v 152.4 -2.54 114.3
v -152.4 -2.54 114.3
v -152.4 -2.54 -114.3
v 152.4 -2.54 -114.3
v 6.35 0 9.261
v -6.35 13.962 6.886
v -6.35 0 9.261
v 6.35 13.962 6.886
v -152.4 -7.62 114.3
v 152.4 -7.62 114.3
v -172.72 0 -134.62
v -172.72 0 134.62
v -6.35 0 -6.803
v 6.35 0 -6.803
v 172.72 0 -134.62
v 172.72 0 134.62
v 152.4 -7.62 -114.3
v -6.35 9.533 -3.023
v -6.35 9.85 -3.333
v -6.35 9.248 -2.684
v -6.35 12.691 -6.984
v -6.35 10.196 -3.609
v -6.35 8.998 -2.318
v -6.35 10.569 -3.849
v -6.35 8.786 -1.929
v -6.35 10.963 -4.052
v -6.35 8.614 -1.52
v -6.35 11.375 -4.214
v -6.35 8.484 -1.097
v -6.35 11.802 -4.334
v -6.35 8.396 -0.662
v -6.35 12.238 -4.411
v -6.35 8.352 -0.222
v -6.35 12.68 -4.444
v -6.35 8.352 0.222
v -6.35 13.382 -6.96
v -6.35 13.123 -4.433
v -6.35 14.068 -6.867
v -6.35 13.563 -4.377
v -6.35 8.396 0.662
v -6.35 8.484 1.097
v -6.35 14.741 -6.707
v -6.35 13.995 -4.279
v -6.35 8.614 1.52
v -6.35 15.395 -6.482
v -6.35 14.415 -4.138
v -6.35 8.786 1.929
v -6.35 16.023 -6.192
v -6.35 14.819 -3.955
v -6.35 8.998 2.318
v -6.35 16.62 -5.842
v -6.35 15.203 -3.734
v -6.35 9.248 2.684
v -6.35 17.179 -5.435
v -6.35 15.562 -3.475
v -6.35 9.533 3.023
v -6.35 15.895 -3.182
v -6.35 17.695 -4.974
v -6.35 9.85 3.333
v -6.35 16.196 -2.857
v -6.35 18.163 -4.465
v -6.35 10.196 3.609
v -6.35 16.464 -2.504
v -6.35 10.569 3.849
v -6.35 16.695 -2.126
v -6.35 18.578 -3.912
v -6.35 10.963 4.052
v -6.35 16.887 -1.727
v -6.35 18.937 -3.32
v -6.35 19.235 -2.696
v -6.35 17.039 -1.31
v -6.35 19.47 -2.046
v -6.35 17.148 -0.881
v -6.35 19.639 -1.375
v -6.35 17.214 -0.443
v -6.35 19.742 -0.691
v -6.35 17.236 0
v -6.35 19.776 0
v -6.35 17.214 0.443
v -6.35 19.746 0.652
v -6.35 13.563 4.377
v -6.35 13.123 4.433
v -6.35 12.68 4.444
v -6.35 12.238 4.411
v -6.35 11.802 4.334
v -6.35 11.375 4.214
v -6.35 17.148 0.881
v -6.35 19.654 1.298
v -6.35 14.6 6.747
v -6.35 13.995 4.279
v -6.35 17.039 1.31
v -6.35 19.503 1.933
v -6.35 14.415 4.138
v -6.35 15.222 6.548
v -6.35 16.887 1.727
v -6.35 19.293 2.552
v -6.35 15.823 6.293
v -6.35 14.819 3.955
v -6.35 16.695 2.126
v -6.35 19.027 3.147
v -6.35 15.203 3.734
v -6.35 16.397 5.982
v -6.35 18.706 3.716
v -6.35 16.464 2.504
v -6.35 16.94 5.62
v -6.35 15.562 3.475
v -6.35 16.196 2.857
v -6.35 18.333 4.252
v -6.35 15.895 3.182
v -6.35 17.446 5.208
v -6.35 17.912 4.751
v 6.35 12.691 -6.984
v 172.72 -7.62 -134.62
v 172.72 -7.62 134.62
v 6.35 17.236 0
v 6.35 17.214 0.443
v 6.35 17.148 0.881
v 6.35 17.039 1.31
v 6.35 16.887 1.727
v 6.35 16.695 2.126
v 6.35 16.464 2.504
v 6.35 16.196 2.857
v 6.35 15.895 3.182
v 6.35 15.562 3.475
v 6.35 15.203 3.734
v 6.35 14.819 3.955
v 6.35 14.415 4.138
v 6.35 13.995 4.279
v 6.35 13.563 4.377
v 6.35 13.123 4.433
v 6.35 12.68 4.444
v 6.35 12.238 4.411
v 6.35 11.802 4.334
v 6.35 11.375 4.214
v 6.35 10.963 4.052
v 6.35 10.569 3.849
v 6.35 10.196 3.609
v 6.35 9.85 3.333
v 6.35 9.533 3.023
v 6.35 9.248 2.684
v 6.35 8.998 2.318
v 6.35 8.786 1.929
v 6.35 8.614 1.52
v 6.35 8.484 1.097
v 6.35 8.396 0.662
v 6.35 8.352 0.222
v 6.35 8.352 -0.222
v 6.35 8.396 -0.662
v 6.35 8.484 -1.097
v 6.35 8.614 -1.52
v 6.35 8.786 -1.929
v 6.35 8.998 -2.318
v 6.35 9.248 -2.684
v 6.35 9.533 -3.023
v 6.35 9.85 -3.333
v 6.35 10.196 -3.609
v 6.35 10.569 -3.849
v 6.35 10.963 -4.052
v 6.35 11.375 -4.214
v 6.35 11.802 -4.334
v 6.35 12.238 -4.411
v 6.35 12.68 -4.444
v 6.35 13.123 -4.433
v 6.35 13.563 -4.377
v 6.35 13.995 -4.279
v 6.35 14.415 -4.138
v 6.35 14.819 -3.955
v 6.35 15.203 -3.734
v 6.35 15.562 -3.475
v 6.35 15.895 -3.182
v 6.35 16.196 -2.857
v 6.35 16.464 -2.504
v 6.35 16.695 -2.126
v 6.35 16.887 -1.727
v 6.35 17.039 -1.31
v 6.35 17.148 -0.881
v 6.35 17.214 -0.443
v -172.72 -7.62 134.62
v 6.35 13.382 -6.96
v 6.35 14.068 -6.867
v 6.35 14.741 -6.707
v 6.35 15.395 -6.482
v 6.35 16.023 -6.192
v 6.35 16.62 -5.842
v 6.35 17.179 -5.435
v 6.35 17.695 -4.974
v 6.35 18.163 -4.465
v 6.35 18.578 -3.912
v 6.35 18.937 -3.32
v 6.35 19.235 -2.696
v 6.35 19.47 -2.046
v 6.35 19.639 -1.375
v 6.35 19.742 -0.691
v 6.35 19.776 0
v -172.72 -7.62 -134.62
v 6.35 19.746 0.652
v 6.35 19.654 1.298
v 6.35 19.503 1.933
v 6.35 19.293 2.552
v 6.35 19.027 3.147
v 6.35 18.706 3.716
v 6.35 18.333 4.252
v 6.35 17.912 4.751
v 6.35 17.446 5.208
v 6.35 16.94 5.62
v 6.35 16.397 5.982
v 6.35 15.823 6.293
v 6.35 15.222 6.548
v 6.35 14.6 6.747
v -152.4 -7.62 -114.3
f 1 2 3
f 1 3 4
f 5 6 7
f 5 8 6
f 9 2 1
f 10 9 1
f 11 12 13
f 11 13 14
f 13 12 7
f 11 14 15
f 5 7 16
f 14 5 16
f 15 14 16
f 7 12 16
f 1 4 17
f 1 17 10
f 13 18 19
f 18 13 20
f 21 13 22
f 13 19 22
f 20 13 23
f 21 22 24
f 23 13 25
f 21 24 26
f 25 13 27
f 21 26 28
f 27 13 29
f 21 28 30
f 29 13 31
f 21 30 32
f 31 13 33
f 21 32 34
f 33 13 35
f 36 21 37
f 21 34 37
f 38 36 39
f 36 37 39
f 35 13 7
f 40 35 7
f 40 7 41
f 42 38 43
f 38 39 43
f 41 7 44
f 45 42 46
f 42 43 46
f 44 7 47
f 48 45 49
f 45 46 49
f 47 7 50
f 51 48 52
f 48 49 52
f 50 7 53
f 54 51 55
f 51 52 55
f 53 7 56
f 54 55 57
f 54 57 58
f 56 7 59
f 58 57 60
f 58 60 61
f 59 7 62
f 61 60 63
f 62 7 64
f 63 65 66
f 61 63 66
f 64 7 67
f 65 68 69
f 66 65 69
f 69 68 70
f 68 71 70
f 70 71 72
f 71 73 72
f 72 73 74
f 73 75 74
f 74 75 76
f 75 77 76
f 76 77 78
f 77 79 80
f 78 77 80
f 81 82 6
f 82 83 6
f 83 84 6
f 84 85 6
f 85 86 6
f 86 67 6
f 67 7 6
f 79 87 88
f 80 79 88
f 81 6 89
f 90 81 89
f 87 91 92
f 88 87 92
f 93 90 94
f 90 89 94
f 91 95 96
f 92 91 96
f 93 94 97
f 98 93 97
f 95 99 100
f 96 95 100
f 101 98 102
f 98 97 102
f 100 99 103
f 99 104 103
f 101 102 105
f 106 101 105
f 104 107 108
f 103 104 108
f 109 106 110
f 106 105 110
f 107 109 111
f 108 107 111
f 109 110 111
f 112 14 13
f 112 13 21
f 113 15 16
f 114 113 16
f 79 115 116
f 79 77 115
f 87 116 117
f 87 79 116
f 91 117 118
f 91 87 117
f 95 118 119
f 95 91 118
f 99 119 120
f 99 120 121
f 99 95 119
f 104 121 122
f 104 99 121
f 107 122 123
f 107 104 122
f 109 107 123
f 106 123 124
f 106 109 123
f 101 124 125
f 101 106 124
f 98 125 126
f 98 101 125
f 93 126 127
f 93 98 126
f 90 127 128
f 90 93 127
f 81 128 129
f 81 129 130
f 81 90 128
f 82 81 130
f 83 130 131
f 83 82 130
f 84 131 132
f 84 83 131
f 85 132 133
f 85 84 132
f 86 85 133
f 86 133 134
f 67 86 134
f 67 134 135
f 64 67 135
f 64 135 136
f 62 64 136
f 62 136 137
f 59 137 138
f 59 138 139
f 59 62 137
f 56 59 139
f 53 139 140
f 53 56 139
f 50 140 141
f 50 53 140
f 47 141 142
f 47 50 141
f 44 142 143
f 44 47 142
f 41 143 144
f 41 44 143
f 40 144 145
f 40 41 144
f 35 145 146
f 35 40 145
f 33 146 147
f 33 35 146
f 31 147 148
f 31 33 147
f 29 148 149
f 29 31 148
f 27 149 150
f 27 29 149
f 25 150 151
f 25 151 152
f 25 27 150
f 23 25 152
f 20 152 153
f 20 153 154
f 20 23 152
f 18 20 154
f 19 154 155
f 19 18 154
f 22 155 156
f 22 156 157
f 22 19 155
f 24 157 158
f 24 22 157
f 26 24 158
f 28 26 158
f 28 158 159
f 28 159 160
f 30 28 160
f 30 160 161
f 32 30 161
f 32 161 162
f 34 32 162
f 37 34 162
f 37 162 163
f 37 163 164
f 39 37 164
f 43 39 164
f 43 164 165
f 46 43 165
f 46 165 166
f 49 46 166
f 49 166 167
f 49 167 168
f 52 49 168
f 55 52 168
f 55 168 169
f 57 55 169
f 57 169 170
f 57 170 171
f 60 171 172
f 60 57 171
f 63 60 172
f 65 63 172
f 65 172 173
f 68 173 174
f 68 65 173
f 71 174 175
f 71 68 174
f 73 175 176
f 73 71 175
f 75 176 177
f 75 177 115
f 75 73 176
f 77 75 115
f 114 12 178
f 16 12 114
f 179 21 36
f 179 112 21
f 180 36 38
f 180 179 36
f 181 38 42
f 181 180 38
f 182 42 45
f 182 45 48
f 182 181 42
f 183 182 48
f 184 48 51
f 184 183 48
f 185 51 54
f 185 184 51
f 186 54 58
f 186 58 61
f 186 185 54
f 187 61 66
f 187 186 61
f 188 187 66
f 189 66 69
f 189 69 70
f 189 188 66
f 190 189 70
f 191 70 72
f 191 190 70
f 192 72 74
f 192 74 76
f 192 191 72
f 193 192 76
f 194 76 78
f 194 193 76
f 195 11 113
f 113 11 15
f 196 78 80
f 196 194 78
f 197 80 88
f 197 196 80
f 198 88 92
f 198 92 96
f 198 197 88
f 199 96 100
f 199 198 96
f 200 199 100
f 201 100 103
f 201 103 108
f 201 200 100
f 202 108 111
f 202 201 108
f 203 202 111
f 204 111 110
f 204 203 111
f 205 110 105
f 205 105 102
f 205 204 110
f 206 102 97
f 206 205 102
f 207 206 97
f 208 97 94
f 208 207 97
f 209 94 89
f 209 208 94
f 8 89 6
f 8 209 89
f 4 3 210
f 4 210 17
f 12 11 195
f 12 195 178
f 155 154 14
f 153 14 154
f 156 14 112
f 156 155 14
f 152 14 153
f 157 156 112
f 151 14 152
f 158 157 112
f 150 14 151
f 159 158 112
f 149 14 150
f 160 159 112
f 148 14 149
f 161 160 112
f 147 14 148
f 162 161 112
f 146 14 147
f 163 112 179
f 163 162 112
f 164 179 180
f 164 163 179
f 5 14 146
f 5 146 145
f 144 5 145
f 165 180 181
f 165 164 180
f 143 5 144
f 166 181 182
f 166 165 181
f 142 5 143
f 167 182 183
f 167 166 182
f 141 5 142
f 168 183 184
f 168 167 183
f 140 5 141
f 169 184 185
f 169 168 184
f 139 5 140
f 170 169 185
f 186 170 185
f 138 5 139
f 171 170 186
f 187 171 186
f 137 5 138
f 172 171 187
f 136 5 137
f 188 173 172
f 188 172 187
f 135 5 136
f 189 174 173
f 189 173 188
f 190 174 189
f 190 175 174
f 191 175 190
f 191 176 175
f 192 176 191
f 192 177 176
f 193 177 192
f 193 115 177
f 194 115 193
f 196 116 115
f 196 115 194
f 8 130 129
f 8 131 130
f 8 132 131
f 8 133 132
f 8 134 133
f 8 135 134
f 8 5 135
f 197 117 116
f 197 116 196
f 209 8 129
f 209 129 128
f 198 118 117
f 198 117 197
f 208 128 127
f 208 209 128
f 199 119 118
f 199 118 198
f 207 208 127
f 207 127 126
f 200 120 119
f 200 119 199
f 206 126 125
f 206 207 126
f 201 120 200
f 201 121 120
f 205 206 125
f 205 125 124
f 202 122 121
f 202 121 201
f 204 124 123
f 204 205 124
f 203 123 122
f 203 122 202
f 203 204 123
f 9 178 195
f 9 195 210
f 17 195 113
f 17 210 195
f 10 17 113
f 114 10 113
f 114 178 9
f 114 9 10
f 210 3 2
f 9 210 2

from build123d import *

# Parameters (mm, degrees)
F0_W     = 304.8
F0_H     = 228.6
F1_DEPTH = 2.54
F0_W_2   = 345.44
F0_H_2   = 269.24
F2_DEPTH = 7.62
F3_R     = 4.445
F4_DEPTH = 6.35


with BuildPart() as f1:
    # F0 (on Front) → F1 (new body)
    with BuildSketch(Plane.XZ):
        Rectangle(F0_W, F0_H)
    extrude(amount=F1_DEPTH)

    # F0 (on Front) → F2 (join)
    with BuildSketch(Plane.XZ):
        Rectangle(F0_W_2, F0_H_2)
        Rectangle(F0_W, F0_H, mode=Mode.SUBTRACT)
    extrude(amount=F2_DEPTH)

    # F3 (on Right) → F4 (join, symmetric)
    with BuildSketch(Plane.YZ):
        with BuildLine():
            Line((13.962311, 6.886105), (0, 9.260906))
            Line((0, 9.260906), (0, -6.802539))
            Line((0, -6.802539), (12.691058, -6.984284))
            ThreePointArc((12.691058, -6.984284), (5.835232, 0.63752), (13.962311, 6.886105))
        make_face()
        with BuildLine():
            ThreePointArc((19.776078, 0), (18.128272, 4.50606), (13.962311, 6.886105))
            ThreePointArc((13.962311, 6.886105), (5.835232, 0.63752), (12.691058, -6.984284))
            ThreePointArc((12.691058, -6.984284), (17.694729, -4.974378), (19.776078, 0))
        make_face()
        with Locations((12.791078, 0)):
            Circle(F3_R, mode=Mode.SUBTRACT)
    extrude(amount=F4_DEPTH, both=True)


solid = f1.part
